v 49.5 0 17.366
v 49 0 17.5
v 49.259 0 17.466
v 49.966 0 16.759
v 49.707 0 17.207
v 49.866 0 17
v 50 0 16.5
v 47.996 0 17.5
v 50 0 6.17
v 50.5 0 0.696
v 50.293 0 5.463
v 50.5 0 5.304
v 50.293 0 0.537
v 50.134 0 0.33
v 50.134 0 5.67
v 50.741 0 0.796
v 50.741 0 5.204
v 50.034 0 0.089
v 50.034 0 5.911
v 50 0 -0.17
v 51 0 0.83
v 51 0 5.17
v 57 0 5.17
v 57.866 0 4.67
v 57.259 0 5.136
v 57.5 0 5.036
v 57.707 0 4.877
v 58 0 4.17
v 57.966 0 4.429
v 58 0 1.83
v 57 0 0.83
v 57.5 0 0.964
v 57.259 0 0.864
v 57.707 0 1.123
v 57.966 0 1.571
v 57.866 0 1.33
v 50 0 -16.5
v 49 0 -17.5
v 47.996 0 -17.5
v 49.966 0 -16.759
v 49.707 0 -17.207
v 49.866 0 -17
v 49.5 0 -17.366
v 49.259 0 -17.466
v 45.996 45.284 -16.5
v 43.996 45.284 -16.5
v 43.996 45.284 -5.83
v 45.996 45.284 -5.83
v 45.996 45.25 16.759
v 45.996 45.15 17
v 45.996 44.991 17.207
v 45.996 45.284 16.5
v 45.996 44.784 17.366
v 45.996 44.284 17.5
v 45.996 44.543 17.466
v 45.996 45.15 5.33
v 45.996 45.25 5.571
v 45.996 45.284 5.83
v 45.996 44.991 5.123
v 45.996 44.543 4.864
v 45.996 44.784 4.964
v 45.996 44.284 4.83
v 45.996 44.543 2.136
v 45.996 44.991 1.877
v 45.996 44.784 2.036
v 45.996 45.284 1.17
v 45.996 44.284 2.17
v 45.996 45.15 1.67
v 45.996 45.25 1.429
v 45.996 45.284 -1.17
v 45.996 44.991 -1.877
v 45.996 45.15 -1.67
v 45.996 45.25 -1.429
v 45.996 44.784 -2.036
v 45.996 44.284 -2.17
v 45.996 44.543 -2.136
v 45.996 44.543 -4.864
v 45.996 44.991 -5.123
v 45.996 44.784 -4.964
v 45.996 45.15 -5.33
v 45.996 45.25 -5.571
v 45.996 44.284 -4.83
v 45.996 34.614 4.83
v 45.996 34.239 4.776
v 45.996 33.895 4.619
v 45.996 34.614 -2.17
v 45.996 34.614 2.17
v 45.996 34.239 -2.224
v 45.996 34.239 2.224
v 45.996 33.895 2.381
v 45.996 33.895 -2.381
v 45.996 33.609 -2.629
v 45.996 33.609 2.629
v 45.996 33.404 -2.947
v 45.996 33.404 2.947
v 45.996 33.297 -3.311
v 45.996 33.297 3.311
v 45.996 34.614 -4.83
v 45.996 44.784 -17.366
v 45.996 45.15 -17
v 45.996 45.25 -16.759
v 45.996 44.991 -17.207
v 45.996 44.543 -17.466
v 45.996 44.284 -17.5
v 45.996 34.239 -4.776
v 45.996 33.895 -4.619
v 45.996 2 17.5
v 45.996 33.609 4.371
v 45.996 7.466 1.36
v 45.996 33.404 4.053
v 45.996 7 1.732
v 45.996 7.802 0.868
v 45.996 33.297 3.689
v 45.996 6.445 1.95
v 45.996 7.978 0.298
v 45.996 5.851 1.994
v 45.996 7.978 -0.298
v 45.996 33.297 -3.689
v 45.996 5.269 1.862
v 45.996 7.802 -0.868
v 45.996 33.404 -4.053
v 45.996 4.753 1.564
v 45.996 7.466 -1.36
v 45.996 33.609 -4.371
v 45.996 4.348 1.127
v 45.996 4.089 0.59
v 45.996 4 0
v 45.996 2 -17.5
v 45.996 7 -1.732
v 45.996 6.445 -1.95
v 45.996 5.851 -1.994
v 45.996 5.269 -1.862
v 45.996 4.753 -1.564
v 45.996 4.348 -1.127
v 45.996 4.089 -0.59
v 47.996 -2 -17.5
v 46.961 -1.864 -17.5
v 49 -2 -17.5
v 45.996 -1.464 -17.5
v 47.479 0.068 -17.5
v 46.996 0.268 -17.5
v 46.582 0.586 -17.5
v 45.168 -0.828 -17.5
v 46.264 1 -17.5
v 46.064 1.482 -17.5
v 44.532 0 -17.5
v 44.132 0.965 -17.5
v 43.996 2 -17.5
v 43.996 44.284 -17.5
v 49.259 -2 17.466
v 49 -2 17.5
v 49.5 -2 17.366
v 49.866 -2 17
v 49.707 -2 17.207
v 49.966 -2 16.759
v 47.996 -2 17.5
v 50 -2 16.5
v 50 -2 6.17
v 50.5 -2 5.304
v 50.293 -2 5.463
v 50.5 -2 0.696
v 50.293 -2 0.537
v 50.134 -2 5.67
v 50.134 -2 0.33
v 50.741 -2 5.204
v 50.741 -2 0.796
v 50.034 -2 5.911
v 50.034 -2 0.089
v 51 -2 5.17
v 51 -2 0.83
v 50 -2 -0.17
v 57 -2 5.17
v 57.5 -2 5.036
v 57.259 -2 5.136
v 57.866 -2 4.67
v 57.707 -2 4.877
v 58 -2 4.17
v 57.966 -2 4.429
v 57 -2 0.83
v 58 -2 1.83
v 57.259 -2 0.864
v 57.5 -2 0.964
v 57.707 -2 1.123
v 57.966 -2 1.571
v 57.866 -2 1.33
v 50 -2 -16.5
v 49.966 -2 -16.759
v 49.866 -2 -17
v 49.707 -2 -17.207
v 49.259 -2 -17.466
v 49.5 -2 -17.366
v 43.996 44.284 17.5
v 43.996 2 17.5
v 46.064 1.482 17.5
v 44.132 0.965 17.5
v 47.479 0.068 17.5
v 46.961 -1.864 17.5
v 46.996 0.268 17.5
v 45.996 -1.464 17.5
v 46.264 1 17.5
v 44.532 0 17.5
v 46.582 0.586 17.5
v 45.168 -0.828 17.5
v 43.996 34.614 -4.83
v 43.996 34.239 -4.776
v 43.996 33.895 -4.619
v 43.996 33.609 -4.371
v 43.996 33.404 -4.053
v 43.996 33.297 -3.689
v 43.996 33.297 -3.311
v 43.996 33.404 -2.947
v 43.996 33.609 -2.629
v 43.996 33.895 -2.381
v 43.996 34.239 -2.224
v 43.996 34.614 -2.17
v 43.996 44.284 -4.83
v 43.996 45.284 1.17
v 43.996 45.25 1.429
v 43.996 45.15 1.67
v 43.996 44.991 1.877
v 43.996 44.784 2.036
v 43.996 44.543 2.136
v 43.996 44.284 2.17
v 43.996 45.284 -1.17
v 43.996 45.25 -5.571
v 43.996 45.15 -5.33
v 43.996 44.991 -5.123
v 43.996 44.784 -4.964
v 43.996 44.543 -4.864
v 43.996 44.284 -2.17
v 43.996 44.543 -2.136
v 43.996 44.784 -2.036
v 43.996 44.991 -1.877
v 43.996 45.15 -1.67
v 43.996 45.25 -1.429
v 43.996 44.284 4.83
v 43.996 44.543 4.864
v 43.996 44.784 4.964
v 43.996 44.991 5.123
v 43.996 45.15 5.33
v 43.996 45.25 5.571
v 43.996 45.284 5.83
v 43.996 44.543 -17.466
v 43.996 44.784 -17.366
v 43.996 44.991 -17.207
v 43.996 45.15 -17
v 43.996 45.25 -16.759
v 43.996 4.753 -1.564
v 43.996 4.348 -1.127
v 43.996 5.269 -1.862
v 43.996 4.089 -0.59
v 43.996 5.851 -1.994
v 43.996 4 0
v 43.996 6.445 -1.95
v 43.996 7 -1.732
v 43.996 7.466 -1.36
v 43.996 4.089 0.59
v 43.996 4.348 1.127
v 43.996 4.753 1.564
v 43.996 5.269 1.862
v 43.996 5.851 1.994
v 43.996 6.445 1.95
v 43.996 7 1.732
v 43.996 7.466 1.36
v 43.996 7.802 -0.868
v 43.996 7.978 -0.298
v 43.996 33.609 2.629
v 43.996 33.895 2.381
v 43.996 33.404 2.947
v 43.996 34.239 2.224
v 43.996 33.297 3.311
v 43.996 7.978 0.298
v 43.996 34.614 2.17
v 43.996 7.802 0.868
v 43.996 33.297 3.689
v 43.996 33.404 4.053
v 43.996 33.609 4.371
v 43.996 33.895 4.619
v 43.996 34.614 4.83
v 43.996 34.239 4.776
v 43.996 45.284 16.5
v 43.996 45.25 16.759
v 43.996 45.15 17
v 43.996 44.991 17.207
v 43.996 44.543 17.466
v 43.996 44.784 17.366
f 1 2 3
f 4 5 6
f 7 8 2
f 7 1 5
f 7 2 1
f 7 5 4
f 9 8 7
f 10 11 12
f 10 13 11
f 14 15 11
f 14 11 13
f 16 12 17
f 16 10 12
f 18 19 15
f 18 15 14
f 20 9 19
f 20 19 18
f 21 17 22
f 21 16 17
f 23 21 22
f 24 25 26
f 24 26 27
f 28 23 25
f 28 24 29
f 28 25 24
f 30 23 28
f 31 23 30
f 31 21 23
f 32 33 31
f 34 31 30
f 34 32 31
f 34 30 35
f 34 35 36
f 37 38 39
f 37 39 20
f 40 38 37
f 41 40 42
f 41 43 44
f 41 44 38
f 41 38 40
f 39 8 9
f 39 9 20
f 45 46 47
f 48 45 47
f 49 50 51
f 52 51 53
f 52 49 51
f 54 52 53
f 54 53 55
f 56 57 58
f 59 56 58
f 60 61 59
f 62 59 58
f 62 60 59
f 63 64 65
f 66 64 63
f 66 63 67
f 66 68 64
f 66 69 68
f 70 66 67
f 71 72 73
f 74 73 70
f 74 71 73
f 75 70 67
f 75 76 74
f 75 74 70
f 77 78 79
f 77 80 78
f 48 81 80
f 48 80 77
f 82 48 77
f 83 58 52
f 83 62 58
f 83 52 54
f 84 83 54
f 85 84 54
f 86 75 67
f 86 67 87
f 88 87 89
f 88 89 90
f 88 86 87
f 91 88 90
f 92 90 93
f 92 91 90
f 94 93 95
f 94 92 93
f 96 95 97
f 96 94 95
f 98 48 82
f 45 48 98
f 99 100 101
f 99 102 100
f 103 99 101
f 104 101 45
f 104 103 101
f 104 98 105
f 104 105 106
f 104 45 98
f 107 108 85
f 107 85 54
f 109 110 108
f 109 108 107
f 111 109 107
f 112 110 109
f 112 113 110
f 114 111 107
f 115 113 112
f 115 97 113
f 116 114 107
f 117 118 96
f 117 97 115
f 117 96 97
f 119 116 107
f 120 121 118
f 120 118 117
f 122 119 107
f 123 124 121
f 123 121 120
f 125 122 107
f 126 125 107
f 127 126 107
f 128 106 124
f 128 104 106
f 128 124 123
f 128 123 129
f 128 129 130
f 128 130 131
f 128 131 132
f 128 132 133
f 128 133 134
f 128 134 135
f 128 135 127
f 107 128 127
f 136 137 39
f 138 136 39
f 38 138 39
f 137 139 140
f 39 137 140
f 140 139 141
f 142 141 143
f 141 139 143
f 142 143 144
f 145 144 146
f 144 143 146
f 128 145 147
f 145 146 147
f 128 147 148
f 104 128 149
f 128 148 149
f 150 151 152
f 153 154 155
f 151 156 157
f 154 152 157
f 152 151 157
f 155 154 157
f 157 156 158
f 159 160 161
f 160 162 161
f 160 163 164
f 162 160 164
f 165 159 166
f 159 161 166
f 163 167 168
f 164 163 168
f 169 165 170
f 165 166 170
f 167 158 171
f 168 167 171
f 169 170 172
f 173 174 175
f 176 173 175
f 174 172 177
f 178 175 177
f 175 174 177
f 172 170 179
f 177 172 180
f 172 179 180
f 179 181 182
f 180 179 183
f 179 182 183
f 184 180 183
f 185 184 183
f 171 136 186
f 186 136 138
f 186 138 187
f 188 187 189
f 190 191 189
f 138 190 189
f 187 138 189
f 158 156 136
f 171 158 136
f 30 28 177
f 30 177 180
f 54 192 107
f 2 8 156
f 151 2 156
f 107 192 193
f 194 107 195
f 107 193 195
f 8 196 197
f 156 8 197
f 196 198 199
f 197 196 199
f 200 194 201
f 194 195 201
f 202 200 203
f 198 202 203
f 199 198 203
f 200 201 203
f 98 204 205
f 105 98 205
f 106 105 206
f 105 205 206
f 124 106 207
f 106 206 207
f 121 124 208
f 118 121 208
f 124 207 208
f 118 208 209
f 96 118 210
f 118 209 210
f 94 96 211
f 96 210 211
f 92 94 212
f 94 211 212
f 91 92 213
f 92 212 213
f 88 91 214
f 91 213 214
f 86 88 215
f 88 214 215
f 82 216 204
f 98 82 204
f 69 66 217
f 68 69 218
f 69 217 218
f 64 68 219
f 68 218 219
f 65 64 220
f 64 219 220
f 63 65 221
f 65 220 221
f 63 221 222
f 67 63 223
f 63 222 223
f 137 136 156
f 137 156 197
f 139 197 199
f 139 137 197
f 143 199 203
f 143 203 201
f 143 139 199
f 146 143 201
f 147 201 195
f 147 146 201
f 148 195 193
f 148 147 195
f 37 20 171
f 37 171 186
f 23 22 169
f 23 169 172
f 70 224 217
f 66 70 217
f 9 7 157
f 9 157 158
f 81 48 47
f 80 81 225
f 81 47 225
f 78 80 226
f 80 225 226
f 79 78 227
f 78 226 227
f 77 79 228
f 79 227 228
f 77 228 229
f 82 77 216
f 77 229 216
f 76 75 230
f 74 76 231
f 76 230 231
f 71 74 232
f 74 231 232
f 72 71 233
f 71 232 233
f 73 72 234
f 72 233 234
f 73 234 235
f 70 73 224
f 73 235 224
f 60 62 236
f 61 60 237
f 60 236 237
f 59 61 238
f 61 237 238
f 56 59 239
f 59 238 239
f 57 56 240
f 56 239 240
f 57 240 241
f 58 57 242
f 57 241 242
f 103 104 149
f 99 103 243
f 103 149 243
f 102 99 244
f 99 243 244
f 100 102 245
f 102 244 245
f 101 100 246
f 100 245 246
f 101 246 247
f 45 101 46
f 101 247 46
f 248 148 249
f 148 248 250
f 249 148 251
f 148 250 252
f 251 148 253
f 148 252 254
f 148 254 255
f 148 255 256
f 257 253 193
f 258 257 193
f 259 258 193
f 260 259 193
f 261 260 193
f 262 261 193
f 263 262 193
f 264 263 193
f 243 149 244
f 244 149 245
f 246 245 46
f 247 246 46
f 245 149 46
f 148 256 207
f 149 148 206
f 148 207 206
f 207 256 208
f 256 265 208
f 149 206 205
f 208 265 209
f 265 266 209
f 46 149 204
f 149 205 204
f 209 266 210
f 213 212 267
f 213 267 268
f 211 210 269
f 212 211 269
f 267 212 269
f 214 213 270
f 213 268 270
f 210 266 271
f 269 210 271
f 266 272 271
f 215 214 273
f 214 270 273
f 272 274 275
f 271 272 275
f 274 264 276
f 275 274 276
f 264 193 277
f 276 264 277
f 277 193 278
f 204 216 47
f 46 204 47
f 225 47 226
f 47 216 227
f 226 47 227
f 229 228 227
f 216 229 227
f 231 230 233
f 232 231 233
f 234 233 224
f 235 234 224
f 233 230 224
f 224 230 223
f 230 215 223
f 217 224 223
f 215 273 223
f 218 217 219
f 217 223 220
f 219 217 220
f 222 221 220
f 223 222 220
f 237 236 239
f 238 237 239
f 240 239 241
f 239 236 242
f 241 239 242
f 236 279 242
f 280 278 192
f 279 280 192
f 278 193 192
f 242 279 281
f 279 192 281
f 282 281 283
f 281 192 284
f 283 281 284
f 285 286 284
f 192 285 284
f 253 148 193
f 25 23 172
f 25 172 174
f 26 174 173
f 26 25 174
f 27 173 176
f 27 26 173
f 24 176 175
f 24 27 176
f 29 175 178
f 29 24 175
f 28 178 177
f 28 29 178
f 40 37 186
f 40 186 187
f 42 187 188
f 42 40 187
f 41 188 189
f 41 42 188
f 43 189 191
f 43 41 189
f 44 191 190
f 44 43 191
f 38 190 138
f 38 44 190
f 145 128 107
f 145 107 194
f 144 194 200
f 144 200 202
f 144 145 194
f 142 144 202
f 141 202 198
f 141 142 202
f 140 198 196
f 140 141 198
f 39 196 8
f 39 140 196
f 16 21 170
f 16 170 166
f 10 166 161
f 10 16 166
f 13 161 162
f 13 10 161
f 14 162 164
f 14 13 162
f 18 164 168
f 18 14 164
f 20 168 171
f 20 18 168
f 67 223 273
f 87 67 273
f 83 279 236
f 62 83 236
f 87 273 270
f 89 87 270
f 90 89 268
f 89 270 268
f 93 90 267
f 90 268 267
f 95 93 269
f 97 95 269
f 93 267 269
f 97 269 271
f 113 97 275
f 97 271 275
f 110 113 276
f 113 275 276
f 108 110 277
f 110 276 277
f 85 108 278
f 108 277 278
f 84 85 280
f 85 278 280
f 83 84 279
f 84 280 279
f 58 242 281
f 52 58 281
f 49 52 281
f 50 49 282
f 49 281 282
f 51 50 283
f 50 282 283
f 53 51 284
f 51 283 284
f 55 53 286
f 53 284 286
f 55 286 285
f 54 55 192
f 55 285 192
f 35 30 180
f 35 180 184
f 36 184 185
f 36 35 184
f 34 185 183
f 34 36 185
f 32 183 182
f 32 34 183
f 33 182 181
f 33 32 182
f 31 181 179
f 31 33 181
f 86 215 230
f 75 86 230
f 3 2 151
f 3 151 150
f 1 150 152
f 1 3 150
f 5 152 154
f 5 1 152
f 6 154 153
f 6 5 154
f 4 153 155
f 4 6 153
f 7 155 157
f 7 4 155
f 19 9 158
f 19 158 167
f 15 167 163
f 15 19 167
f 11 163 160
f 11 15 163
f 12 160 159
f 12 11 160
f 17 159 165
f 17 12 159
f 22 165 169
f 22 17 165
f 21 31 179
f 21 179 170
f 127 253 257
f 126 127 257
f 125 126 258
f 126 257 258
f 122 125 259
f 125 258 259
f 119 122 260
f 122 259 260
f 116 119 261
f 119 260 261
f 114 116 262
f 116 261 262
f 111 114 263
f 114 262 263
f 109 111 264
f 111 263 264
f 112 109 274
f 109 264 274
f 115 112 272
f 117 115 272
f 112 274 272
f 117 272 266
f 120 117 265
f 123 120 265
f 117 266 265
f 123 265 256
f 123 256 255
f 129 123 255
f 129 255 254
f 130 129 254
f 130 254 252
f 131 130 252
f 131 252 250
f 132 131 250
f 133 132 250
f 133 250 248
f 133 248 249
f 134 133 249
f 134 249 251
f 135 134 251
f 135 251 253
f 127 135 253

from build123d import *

# Parameters (mm, degrees)
BASE_FLANGE1_DEPTH       = 2
SKETCHED_BEND1_OUTLINE_W = 2
SKETCHED_BEND1_OUTLINE_H = 35
SKETCHED_BEND1_DEPTH     = 44.40715449
SKETCHED_START           = 45.98523449
SKETCHED_BEND1_2_DEPTH   = 0.01096
SKETCHED_START_2         = 43.99619449
SKETCHED_BEND1_3_DEPTH   = 4
SKETCHED_START_3         = -17.5
SKETCHED_BEND1_4_DEPTH   = 35
SKETCH7_R                = 2
CUT_EXTRUDE1_DEPTH       = 10


with BuildPart() as part:
    # Base-Flange1: sheet metal written as solids
    # Sketch1 → Base-Flange1 (new body)
    with BuildSketch(Plane(origin=(0, 0, 0), x_dir=(1, 0, 0), z_dir=(0, 1, 0))):
        with BuildLine():
            Line((0, 16.5), (0, 5.83))
            ThreePointArc((0, 5.83), (0.292893219, 5.122893219), (1, 4.83))
            Line((1, 4.83), (10.67, 4.83))
            ThreePointArc((10.67, 4.83), (12, 3.5), (10.67, 2.17))
            Line((10.67, 2.17), (1, 2.17))
            ThreePointArc((1, 2.17), (0.292893219, 1.877106781), (0, 1.17))
            Line((0, 1.17), (0, -1.17))
            ThreePointArc((0, -1.17), (0.292893219, -1.877106781), (1, -2.17))
            Line((1, -2.17), (10.67, -2.17))
            ThreePointArc((10.67, -2.17), (12, -3.5), (10.67, -4.83))
            Line((10.67, -4.83), (1, -4.83))
            ThreePointArc((1, -4.83), (0.292893219, -5.122893219), (0, -5.83))
            Line((0, -5.83), (0, -16.5))
            ThreePointArc((0, -16.5), (0.292893219, -17.207106781), (1, -17.5))
            Line((1, -17.5), (49, -17.5))
            ThreePointArc((49, -17.5), (49.707106781, -17.207106781), (50, -16.5))
            Line((50, -16.5), (50, -6.17))
            ThreePointArc((50, -6.17), (50.292893219, -5.462893219), (51, -5.17))
            Line((51, -5.17), (57, -5.17))
            ThreePointArc((57, -5.17), (57.707106781, -4.877106781), (58, -4.17))
            Line((58, -4.17), (58, -1.83))
            ThreePointArc((58, -1.83), (57.707106781, -1.122893219), (57, -0.83))
            Line((57, -0.83), (51, -0.83))
            ThreePointArc((51, -0.83), (50.292893219, -0.537106781), (50, 0.17))
            Line((50, 0.17), (50, 16.5))
            ThreePointArc((50, 16.5), (49.707106781, 17.207106781), (49, 17.5))
            Line((49, 17.5), (1, 17.5))
            ThreePointArc((1, 17.5), (0.292893219, 17.207106781), (0, 16.5))
        make_face()
    extrude(amount=-BASE_FLANGE1_DEPTH)

    # Sketched Bend1: read off the stored shape, not the designer's step
    # Sketched Bend1 outline → Sketched Bend1 (cut)
    with BuildSketch(Plane.YZ):
        with Locations((-1, 0)):
            Rectangle(SKETCHED_BEND1_OUTLINE_W, SKETCHED_BEND1_OUTLINE_H)
    extrude(amount=SKETCHED_BEND1_DEPTH, mode=Mode.SUBTRACT)

    # Sketched Bend1 2 outline → Sketched Bend1 2 (add)
    with BuildSketch(Plane.YZ.offset(SKETCHED_START)):
        with BuildLine():
            Line((0, -17.5), (44.28380551, -17.5))
            ThreePointArc((44.28380551, -17.5), (44.990912291, -17.207106781), (45.28380551, -16.5))
            Line((45.28380551, -16.5), (45.28380551, -5.83))
            ThreePointArc((45.28380551, -5.83), (44.990912291, -5.122893219), (44.28380551, -4.83))
            Line((44.28380551, -4.83), (34.61380551, -4.83))
            ThreePointArc((34.61380551, -4.83), (33.28380551, -3.5), (34.61380551, -2.17))
            Line((34.61380551, -2.17), (44.28380551, -2.17))
            ThreePointArc((44.28380551, -2.17), (44.990912291, -1.877106781), (45.28380551, -1.17))
            Line((45.28380551, -1.17), (45.28380551, 1.17))
            ThreePointArc((45.28380551, 1.17), (44.990912291, 1.877106781), (44.28380551, 2.17))
            Line((44.28380551, 2.17), (34.61380551, 2.17))
            ThreePointArc((34.61380551, 2.17), (33.28380551, 3.5), (34.61380551, 4.83))
            Line((34.61380551, 4.83), (44.28380551, 4.83))
            ThreePointArc((44.28380551, 4.83), (44.990912291, 5.122893219), (45.28380551, 5.83))
            Line((45.28380551, 5.83), (45.28380551, 16.5))
            ThreePointArc((45.28380551, 16.5), (44.990912291, 17.207106781), (44.28380551, 17.5))
            Line((44.28380551, 17.5), (0, 17.5))
            Line((0, 17.5), (0, -17.5))
        make_face()
    extrude(amount=SKETCHED_BEND1_2_DEPTH)

    # Sketched Bend1 3 outline → Sketched Bend1 3 (add)
    with BuildSketch(Plane.YZ.offset(SKETCHED_START_2)):
        with BuildLine():
            Line((0, -17.5), (44.28380551, -17.5))
            ThreePointArc((44.28380551, -17.5), (44.990912291, -17.207106781), (45.28380551, -16.5))
            Line((45.28380551, -16.5), (45.28380551, -5.83))
            ThreePointArc((45.28380551, -5.83), (44.990912291, -5.122893219), (44.28380551, -4.83))
            Line((44.28380551, -4.83), (34.61380551, -4.83))
            ThreePointArc((34.61380551, -4.83), (33.28380551, -3.5), (34.61380551, -2.17))
            Line((34.61380551, -2.17), (44.28380551, -2.17))
            ThreePointArc((44.28380551, -2.17), (44.990912291, -1.877106781), (45.28380551, -1.17))
            Line((45.28380551, -1.17), (45.28380551, 1.17))
            ThreePointArc((45.28380551, 1.17), (44.990912291, 1.877106781), (44.28380551, 2.17))
            Line((44.28380551, 2.17), (34.61380551, 2.17))
            ThreePointArc((34.61380551, 2.17), (33.28380551, 3.5), (34.61380551, 4.83))
            Line((34.61380551, 4.83), (44.28380551, 4.83))
            ThreePointArc((44.28380551, 4.83), (44.990912291, 5.122893219), (45.28380551, 5.83))
            Line((45.28380551, 5.83), (45.28380551, 16.5))
            ThreePointArc((45.28380551, 16.5), (44.990912291, 17.207106781), (44.28380551, 17.5))
            Line((44.28380551, 17.5), (0, 17.5))
            Line((0, 17.5), (0, -17.5))
        make_face()
    extrude(amount=SKETCHED_BEND1_3_DEPTH)

    # Sketched Bend1 4 outline → Sketched Bend1 4 (cut)
    with BuildSketch(Plane.XY.offset(SKETCHED_START_3)):
        with BuildLine():
            Line((47.99619449, 45.28380551), (45.99619449, 45.28380551))
            Line((45.99619449, 45.28380551), (45.99619449, 2))
            ThreePointArc((45.99619449, 2), (46.581980928, 0.585786438), (47.99619449, 0))
            Line((47.99619449, 0), (47.99619449, 45.28380551))
        make_face()
        with BuildLine():
            ThreePointArc((47.99619449, -2), (45.167767365, -0.828427125), (43.99619449, 2))
            Line((43.99619449, 2), (43.99619449, 0))
            Line((43.99619449, 0), (44.40715449, 0))
            Line((44.40715449, 0), (44.40715449, -2))
            Line((44.40715449, -2), (47.99619449, -2))
        make_face()
    extrude(amount=SKETCHED_BEND1_4_DEPTH, mode=Mode.SUBTRACT)

    # Sketch7 → Cut-Extrude1 (cut)
    with BuildSketch(Plane.ZY.offset(-43.99619449)):
        with Locations(Location((0, 6, 0), (0, 0, 270))):
            Circle(SKETCH7_R)
    extrude(amount=-CUT_EXTRUDE1_DEPTH, mode=Mode.SUBTRACT)


solid = part.part
